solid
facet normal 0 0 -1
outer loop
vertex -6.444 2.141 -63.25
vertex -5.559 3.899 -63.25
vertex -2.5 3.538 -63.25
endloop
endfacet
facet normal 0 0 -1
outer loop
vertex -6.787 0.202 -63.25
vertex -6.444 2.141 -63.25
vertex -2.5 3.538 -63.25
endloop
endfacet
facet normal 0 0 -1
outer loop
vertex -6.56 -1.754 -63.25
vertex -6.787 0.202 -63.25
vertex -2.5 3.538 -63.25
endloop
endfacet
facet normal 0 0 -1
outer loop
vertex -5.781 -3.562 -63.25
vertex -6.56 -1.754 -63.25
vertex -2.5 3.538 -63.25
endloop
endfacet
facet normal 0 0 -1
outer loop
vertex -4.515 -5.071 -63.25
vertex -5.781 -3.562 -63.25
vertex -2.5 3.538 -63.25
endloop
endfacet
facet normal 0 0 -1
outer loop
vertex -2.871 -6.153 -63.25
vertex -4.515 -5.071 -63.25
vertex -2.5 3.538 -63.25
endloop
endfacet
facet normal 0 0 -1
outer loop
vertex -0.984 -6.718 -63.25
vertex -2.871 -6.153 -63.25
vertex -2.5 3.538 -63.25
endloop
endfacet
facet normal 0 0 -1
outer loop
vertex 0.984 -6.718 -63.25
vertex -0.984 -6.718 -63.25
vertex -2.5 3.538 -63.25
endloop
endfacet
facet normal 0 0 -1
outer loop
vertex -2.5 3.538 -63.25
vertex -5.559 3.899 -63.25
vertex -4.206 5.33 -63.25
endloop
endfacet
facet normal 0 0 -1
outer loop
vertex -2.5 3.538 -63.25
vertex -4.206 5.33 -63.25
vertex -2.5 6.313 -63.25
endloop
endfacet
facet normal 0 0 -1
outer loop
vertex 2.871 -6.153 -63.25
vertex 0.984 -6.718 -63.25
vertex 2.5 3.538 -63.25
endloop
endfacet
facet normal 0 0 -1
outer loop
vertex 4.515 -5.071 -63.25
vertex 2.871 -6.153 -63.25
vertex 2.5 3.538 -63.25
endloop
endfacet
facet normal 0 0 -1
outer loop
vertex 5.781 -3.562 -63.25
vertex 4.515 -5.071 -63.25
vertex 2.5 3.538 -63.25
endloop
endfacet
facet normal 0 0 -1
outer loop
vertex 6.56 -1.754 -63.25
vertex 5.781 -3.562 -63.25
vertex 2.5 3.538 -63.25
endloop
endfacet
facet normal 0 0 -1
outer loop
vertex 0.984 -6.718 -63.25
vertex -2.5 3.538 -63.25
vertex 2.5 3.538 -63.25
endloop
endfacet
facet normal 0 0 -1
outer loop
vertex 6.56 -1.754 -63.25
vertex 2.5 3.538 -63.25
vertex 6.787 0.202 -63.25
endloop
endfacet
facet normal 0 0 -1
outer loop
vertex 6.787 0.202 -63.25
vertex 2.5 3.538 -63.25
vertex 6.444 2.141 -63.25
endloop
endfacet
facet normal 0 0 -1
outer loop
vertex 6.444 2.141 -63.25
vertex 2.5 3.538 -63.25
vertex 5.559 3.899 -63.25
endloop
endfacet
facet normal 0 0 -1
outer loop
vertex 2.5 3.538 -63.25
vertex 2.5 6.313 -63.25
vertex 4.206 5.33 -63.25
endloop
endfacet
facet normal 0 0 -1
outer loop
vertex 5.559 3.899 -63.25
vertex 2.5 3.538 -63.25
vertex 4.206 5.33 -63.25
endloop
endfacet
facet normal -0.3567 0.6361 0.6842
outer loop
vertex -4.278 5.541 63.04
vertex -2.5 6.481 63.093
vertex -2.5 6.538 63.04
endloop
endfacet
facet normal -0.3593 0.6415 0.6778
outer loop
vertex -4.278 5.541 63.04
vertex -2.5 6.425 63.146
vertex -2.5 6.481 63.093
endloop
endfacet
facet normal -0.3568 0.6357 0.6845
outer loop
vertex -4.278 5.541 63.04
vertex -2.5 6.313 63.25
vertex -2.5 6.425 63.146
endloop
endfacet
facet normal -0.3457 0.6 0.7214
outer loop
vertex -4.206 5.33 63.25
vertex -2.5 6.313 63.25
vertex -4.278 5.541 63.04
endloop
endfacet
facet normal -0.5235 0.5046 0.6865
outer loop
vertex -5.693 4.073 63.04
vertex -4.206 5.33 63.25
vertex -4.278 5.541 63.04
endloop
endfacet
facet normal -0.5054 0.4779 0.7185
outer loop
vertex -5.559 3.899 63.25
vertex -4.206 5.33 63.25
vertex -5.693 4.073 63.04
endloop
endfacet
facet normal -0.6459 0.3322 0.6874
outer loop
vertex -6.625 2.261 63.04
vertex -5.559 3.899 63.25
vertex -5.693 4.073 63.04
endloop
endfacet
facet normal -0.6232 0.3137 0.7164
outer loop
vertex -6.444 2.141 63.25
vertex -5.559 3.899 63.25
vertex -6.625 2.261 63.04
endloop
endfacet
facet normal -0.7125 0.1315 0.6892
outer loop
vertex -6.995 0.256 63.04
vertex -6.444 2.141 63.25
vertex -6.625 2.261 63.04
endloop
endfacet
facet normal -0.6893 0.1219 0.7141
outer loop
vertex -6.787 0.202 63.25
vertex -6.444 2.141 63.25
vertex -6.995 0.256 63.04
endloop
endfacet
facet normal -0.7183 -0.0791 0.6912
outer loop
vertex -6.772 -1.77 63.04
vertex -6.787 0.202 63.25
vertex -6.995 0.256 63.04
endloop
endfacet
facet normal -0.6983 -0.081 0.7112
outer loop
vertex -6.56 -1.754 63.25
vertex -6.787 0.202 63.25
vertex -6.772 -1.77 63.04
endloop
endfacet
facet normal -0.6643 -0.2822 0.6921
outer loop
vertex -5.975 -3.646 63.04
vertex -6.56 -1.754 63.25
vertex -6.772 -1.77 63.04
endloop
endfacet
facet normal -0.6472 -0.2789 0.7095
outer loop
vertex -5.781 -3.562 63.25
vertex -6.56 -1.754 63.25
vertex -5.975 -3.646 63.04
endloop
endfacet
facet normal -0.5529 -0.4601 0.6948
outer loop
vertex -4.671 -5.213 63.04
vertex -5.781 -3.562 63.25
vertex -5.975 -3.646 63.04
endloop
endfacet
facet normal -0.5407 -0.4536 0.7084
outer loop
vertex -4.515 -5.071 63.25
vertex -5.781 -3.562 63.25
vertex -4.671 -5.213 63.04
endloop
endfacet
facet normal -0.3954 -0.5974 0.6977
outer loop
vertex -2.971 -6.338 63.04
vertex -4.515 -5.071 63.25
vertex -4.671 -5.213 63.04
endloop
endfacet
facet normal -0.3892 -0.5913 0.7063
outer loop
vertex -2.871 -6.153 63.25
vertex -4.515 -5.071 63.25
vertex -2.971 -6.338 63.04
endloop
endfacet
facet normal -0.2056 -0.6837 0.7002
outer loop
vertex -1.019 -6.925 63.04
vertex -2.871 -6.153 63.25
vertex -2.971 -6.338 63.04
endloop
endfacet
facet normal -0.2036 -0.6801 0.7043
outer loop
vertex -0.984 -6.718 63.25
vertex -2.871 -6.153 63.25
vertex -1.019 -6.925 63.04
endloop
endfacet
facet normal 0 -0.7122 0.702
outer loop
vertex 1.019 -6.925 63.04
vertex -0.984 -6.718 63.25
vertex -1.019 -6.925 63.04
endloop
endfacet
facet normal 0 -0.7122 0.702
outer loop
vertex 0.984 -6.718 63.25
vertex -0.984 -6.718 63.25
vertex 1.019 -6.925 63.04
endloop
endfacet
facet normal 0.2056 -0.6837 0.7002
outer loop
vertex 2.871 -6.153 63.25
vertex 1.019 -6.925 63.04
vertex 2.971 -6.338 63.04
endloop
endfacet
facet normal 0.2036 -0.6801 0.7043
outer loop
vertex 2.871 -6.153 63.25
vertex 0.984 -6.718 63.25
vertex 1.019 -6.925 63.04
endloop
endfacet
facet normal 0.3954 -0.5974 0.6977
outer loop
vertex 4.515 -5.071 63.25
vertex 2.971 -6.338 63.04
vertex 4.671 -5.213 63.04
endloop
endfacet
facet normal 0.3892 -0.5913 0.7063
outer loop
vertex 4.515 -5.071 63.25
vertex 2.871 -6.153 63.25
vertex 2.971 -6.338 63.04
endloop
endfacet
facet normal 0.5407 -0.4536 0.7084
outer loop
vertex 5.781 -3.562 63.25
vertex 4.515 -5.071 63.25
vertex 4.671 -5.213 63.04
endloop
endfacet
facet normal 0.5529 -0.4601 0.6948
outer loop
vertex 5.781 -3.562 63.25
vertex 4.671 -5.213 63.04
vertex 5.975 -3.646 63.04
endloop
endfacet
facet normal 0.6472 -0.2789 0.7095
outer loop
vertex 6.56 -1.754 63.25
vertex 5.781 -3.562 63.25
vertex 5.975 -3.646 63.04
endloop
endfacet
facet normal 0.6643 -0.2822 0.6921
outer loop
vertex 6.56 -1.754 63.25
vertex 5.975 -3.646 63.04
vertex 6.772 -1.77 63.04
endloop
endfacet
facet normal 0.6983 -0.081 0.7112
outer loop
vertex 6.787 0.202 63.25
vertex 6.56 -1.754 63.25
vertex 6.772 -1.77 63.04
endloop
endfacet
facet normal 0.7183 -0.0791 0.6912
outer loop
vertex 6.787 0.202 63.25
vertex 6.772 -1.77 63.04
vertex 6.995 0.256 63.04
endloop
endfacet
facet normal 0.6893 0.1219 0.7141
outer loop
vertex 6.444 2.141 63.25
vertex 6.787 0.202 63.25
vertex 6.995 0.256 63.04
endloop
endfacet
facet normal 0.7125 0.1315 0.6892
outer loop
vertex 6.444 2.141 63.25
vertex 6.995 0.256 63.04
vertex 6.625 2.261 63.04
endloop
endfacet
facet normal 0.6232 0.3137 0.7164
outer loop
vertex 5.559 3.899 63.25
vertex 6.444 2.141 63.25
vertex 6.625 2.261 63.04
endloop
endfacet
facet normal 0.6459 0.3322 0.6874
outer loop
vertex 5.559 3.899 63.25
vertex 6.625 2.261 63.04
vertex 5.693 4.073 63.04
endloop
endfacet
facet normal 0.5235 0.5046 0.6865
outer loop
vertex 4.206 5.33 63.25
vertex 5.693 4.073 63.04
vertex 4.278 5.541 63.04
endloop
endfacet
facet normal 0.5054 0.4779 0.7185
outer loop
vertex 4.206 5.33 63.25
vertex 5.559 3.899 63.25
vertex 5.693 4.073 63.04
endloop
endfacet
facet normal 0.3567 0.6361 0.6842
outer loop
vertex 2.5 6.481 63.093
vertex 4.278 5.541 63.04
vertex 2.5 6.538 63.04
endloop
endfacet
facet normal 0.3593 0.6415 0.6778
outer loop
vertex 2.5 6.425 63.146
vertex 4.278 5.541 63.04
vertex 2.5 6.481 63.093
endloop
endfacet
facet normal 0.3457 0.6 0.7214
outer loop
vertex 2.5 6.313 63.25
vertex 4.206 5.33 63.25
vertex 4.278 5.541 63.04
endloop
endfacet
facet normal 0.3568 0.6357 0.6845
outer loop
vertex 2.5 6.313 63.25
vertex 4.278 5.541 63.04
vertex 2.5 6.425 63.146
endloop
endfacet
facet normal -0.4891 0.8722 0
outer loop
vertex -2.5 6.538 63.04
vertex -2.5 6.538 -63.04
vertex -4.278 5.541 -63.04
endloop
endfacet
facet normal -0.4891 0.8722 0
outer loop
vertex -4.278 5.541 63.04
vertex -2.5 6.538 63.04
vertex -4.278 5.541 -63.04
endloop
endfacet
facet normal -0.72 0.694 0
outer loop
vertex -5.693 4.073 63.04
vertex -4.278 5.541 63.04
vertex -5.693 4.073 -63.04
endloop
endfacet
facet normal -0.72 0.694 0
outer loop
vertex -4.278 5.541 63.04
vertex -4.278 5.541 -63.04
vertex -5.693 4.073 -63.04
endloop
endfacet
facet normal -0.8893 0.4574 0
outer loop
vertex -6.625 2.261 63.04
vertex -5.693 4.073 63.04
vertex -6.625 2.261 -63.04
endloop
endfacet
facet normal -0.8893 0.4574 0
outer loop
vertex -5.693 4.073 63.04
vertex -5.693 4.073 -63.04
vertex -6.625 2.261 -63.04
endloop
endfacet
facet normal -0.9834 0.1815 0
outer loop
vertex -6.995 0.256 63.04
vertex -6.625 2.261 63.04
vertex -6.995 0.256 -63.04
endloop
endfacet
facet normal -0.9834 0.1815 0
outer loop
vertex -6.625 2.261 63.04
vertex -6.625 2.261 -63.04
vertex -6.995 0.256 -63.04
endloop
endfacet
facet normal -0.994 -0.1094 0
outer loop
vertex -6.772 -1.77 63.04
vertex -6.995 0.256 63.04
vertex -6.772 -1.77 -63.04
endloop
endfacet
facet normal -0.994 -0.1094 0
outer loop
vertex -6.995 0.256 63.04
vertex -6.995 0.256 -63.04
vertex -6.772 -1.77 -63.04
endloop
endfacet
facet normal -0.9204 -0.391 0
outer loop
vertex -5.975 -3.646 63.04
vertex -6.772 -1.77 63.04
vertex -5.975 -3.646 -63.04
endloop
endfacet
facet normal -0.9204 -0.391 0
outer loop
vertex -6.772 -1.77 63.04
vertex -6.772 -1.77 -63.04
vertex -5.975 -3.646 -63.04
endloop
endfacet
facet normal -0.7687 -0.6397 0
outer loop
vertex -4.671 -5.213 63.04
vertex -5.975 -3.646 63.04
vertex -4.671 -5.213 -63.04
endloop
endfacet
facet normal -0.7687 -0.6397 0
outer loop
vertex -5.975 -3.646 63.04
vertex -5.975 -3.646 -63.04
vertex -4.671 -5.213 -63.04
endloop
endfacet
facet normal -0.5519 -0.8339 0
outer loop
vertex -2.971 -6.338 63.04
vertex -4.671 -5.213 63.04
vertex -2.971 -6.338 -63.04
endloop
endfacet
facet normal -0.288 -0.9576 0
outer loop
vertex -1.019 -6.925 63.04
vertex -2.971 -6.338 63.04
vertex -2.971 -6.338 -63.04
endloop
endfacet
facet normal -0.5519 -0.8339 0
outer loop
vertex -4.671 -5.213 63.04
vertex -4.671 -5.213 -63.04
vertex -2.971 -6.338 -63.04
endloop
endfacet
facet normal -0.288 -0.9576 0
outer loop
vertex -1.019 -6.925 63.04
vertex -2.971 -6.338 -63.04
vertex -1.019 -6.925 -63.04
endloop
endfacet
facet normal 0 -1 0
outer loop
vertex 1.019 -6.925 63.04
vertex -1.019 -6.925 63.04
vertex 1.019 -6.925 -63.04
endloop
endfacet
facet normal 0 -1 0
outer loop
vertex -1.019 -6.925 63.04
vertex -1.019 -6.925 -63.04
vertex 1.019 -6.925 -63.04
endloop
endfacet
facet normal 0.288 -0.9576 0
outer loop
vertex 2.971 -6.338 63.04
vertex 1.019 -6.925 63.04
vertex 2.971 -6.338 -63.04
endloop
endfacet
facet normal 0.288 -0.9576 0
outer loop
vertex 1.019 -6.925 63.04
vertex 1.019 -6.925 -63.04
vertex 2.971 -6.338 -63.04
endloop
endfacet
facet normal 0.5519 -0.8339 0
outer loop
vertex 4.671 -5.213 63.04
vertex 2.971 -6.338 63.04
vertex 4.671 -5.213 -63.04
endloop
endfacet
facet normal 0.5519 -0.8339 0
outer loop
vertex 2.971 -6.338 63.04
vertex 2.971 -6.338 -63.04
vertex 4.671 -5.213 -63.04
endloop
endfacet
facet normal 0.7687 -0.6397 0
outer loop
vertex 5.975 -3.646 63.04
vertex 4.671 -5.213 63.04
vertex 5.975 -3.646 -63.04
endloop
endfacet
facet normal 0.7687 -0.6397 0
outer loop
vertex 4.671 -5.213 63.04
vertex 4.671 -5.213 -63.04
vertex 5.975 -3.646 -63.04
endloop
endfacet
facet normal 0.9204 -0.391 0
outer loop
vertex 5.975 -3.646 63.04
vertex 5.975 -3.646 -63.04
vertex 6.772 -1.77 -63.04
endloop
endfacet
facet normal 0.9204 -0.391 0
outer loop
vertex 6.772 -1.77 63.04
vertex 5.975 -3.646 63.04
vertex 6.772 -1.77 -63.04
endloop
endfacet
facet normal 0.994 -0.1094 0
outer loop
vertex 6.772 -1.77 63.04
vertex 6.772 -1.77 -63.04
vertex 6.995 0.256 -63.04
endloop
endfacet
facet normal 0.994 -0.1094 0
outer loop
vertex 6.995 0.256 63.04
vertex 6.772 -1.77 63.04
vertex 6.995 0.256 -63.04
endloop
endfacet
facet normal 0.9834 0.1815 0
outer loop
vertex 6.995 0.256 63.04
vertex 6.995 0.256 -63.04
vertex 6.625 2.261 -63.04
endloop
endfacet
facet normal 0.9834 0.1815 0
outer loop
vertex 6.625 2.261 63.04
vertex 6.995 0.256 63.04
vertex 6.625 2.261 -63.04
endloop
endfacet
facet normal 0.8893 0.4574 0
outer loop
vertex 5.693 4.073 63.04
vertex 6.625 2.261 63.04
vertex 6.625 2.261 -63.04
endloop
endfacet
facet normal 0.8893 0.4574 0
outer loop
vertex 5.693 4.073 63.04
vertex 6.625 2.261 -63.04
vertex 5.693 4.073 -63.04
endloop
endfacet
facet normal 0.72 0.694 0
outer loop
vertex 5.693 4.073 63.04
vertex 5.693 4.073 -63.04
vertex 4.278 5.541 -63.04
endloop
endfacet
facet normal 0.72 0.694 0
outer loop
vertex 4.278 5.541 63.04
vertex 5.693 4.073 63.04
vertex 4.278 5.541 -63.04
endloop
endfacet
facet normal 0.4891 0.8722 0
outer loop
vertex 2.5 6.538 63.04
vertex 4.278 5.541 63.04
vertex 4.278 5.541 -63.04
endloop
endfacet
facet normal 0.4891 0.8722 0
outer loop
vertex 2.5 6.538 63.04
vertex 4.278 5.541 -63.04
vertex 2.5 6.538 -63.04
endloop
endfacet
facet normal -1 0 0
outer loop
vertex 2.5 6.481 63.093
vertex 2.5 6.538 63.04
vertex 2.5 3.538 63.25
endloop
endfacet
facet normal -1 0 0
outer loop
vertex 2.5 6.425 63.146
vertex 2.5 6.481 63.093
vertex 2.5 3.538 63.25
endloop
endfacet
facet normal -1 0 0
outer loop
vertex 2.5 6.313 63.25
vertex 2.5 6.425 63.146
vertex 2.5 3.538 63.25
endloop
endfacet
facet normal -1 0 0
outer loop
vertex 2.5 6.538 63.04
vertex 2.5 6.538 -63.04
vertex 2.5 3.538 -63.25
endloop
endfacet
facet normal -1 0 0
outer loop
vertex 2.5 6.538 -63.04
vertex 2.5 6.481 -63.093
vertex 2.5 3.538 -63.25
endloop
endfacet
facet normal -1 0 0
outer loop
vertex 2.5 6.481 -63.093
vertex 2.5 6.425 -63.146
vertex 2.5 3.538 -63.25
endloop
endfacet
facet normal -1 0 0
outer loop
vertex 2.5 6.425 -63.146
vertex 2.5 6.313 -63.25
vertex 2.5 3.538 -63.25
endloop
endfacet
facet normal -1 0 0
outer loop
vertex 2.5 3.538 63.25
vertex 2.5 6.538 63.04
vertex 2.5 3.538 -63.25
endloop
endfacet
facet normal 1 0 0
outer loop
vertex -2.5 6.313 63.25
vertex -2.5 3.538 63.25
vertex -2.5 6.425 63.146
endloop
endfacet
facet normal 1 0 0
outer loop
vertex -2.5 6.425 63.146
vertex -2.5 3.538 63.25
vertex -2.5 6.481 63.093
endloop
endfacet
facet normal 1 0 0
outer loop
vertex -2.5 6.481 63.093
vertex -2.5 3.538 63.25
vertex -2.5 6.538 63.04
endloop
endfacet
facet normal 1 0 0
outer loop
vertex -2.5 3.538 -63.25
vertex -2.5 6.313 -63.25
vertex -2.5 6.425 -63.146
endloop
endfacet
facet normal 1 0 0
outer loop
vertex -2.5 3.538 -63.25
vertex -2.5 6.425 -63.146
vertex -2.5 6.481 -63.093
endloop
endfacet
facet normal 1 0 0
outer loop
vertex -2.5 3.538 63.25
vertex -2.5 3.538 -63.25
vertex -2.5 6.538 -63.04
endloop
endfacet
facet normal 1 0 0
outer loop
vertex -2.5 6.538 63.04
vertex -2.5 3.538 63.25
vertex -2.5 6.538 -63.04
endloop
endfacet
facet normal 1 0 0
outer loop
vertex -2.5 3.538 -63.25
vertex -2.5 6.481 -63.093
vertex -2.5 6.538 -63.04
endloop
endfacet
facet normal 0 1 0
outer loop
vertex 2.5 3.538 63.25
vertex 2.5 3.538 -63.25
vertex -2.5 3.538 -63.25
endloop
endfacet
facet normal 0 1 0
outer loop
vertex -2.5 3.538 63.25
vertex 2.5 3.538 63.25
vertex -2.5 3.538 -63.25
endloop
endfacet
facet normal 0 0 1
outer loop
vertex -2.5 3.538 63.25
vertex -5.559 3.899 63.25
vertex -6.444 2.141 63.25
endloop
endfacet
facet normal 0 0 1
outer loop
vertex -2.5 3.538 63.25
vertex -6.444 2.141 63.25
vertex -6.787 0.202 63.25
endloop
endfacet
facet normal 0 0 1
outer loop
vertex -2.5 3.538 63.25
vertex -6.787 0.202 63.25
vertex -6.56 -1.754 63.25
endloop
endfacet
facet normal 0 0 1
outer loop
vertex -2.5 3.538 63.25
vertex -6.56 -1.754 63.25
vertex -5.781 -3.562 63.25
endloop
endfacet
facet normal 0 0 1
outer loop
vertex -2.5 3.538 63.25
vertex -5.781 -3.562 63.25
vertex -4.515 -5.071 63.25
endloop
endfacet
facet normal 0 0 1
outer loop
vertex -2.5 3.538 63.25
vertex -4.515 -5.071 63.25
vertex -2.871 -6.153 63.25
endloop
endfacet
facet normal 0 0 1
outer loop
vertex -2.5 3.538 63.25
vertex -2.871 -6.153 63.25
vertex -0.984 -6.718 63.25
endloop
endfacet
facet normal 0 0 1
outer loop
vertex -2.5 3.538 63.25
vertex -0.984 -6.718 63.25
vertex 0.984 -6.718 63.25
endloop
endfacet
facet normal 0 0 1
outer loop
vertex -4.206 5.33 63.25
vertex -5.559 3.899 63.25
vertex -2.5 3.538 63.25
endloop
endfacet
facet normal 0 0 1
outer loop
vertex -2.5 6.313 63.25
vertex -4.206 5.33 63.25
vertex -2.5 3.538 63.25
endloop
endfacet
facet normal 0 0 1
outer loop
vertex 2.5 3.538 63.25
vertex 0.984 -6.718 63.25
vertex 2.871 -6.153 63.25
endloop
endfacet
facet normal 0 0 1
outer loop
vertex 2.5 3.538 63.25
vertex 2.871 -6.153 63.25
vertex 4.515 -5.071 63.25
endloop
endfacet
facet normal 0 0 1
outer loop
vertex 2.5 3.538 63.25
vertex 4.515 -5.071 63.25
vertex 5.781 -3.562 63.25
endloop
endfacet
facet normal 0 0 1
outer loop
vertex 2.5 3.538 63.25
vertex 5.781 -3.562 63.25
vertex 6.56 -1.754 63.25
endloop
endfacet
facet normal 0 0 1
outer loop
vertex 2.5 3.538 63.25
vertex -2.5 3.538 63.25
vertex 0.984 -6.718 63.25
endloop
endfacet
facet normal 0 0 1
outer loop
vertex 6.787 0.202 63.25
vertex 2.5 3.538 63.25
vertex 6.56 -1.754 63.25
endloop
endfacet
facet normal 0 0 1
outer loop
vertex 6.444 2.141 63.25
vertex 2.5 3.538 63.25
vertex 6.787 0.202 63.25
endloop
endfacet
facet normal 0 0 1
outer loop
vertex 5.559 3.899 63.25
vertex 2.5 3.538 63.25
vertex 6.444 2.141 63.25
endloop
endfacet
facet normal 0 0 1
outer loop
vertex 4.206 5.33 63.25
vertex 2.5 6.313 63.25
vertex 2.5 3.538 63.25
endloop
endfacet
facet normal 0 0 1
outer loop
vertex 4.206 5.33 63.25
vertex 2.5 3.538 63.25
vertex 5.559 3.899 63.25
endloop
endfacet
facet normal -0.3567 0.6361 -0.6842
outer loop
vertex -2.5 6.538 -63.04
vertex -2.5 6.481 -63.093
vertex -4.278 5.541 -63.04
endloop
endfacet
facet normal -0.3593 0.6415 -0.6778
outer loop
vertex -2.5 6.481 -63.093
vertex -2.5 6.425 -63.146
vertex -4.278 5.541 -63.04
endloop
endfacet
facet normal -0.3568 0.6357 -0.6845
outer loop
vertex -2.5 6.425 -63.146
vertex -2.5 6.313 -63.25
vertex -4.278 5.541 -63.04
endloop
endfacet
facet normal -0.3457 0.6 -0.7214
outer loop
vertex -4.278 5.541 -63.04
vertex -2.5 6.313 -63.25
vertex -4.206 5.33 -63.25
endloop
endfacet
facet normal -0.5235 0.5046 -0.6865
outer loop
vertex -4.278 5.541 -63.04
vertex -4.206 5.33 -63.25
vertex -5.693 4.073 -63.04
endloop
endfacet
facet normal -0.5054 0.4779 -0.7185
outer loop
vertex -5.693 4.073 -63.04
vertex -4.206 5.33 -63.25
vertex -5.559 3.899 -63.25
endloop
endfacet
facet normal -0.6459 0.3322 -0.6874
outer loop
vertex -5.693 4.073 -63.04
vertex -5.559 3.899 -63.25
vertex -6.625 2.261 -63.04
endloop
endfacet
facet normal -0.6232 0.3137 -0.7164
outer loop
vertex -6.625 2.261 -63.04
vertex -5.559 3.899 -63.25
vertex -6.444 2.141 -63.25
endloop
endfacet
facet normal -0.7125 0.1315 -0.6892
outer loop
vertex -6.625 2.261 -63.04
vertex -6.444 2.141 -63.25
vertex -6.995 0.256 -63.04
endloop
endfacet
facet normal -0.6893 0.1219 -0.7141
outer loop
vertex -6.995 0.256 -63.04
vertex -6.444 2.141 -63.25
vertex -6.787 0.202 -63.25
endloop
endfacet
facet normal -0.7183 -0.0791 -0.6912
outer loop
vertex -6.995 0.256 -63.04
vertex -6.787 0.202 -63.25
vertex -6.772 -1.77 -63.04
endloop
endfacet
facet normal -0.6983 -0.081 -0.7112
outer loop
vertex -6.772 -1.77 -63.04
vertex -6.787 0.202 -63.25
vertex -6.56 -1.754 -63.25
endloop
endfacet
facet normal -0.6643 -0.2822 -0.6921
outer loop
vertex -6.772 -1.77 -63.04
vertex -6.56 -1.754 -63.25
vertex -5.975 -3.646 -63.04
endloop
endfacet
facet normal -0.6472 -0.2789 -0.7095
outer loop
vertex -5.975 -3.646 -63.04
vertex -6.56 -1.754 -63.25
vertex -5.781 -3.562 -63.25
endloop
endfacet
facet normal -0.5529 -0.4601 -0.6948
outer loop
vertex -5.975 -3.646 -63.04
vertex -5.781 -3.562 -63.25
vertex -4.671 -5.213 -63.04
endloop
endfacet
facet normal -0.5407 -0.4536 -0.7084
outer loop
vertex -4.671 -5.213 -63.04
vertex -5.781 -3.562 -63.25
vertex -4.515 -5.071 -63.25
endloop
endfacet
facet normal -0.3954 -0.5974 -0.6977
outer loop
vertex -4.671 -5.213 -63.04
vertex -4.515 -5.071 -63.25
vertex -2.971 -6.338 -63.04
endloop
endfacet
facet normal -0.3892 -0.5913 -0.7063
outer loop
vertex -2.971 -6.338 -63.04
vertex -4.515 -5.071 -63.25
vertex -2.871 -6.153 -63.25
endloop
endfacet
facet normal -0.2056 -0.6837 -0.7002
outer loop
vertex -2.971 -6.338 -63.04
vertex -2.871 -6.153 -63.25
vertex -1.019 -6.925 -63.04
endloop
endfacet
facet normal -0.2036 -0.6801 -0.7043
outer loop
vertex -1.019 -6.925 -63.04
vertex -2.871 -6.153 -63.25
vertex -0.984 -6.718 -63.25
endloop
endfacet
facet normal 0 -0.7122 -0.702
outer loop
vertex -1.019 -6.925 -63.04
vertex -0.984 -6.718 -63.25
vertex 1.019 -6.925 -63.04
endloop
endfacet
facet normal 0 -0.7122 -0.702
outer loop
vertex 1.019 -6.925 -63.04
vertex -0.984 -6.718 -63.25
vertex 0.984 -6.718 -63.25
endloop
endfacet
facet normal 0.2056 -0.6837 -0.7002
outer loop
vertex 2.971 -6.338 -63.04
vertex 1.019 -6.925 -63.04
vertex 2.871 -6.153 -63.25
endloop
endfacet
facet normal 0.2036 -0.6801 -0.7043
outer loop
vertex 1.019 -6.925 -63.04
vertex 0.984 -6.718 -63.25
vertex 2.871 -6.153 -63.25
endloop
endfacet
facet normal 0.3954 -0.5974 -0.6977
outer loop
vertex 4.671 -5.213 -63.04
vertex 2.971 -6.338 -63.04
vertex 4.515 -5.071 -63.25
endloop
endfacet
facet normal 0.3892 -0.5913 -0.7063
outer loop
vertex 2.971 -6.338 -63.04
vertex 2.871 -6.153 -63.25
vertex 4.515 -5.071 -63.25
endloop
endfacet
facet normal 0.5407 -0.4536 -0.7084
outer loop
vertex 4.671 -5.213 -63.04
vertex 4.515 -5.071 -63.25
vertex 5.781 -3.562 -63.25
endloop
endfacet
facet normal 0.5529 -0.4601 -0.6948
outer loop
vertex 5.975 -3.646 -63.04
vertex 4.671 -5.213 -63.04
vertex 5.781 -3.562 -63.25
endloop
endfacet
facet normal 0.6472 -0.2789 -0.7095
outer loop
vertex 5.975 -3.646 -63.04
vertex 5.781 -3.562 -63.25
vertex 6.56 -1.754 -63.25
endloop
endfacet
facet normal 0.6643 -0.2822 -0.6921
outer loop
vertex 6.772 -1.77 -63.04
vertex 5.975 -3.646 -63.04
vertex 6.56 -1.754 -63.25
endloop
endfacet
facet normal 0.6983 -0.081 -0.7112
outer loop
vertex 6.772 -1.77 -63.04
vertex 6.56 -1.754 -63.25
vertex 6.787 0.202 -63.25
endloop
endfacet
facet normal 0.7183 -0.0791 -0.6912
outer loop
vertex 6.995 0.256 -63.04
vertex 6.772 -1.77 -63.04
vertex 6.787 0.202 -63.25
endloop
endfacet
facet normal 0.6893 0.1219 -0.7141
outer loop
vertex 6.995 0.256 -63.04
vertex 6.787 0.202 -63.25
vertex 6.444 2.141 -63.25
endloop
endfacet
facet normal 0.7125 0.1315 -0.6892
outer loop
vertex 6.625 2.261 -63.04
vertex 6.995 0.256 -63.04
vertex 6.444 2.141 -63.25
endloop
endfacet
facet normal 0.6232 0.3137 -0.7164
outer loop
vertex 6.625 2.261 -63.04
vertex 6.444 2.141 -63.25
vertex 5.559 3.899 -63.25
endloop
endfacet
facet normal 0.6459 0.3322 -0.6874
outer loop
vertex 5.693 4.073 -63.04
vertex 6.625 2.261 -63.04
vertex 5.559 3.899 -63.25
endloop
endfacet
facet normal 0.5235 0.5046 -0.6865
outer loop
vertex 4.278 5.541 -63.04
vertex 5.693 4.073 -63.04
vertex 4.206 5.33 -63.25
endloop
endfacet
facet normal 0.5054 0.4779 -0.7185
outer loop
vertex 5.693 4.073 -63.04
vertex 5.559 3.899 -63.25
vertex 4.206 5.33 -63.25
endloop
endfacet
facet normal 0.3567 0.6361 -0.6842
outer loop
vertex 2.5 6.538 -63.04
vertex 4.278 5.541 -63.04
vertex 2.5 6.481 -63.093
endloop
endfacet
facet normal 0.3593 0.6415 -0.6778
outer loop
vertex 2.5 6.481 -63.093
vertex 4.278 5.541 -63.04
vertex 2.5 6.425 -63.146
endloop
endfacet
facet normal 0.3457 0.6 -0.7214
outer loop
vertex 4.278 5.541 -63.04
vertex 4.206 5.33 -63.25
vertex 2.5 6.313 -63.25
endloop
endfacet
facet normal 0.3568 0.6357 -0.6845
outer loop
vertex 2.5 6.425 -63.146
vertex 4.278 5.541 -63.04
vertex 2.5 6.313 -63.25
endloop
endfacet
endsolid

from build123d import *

# Parameters (mm, degrees)
BOSS_EXTRUDE1_DEPTH      = 63.25
BOSS_EXTRUDE1_DEPTH_BACK = 63.25
CHAMFER1_SIZE            = 0.21


with BuildPart() as part:
    # Sketch3 → Boss-Extrude1 (new, two sides: drawn at the far end of the back side and taken through both)
    with BuildSketch(Plane.XY.offset(-BOSS_EXTRUDE1_DEPTH_BACK)):
        with BuildLine():
            Line((-2.5, 3.538348415), (-2.5, 6.538348415))
            ThreePointArc((-2.5, 6.538348415), (0, -7), (2.5, 6.538348415))
            Line((2.5, 6.538348415), (2.5, 3.538348415))
            Line((2.5, 3.538348415), (-2.5, 3.538348415))
        make_face()
    extrude(amount=BOSS_EXTRUDE1_DEPTH + BOSS_EXTRUDE1_DEPTH_BACK)

    # Chamfer1
    chamfer1_edges = [part.edges().sort_by_distance(p)[0] for p in [
        (0, -7, -63.25),
        (0, -7, 63.25),
    ]]
    chamfer(chamfer1_edges, length=CHAMFER1_SIZE)


solid = part.part
